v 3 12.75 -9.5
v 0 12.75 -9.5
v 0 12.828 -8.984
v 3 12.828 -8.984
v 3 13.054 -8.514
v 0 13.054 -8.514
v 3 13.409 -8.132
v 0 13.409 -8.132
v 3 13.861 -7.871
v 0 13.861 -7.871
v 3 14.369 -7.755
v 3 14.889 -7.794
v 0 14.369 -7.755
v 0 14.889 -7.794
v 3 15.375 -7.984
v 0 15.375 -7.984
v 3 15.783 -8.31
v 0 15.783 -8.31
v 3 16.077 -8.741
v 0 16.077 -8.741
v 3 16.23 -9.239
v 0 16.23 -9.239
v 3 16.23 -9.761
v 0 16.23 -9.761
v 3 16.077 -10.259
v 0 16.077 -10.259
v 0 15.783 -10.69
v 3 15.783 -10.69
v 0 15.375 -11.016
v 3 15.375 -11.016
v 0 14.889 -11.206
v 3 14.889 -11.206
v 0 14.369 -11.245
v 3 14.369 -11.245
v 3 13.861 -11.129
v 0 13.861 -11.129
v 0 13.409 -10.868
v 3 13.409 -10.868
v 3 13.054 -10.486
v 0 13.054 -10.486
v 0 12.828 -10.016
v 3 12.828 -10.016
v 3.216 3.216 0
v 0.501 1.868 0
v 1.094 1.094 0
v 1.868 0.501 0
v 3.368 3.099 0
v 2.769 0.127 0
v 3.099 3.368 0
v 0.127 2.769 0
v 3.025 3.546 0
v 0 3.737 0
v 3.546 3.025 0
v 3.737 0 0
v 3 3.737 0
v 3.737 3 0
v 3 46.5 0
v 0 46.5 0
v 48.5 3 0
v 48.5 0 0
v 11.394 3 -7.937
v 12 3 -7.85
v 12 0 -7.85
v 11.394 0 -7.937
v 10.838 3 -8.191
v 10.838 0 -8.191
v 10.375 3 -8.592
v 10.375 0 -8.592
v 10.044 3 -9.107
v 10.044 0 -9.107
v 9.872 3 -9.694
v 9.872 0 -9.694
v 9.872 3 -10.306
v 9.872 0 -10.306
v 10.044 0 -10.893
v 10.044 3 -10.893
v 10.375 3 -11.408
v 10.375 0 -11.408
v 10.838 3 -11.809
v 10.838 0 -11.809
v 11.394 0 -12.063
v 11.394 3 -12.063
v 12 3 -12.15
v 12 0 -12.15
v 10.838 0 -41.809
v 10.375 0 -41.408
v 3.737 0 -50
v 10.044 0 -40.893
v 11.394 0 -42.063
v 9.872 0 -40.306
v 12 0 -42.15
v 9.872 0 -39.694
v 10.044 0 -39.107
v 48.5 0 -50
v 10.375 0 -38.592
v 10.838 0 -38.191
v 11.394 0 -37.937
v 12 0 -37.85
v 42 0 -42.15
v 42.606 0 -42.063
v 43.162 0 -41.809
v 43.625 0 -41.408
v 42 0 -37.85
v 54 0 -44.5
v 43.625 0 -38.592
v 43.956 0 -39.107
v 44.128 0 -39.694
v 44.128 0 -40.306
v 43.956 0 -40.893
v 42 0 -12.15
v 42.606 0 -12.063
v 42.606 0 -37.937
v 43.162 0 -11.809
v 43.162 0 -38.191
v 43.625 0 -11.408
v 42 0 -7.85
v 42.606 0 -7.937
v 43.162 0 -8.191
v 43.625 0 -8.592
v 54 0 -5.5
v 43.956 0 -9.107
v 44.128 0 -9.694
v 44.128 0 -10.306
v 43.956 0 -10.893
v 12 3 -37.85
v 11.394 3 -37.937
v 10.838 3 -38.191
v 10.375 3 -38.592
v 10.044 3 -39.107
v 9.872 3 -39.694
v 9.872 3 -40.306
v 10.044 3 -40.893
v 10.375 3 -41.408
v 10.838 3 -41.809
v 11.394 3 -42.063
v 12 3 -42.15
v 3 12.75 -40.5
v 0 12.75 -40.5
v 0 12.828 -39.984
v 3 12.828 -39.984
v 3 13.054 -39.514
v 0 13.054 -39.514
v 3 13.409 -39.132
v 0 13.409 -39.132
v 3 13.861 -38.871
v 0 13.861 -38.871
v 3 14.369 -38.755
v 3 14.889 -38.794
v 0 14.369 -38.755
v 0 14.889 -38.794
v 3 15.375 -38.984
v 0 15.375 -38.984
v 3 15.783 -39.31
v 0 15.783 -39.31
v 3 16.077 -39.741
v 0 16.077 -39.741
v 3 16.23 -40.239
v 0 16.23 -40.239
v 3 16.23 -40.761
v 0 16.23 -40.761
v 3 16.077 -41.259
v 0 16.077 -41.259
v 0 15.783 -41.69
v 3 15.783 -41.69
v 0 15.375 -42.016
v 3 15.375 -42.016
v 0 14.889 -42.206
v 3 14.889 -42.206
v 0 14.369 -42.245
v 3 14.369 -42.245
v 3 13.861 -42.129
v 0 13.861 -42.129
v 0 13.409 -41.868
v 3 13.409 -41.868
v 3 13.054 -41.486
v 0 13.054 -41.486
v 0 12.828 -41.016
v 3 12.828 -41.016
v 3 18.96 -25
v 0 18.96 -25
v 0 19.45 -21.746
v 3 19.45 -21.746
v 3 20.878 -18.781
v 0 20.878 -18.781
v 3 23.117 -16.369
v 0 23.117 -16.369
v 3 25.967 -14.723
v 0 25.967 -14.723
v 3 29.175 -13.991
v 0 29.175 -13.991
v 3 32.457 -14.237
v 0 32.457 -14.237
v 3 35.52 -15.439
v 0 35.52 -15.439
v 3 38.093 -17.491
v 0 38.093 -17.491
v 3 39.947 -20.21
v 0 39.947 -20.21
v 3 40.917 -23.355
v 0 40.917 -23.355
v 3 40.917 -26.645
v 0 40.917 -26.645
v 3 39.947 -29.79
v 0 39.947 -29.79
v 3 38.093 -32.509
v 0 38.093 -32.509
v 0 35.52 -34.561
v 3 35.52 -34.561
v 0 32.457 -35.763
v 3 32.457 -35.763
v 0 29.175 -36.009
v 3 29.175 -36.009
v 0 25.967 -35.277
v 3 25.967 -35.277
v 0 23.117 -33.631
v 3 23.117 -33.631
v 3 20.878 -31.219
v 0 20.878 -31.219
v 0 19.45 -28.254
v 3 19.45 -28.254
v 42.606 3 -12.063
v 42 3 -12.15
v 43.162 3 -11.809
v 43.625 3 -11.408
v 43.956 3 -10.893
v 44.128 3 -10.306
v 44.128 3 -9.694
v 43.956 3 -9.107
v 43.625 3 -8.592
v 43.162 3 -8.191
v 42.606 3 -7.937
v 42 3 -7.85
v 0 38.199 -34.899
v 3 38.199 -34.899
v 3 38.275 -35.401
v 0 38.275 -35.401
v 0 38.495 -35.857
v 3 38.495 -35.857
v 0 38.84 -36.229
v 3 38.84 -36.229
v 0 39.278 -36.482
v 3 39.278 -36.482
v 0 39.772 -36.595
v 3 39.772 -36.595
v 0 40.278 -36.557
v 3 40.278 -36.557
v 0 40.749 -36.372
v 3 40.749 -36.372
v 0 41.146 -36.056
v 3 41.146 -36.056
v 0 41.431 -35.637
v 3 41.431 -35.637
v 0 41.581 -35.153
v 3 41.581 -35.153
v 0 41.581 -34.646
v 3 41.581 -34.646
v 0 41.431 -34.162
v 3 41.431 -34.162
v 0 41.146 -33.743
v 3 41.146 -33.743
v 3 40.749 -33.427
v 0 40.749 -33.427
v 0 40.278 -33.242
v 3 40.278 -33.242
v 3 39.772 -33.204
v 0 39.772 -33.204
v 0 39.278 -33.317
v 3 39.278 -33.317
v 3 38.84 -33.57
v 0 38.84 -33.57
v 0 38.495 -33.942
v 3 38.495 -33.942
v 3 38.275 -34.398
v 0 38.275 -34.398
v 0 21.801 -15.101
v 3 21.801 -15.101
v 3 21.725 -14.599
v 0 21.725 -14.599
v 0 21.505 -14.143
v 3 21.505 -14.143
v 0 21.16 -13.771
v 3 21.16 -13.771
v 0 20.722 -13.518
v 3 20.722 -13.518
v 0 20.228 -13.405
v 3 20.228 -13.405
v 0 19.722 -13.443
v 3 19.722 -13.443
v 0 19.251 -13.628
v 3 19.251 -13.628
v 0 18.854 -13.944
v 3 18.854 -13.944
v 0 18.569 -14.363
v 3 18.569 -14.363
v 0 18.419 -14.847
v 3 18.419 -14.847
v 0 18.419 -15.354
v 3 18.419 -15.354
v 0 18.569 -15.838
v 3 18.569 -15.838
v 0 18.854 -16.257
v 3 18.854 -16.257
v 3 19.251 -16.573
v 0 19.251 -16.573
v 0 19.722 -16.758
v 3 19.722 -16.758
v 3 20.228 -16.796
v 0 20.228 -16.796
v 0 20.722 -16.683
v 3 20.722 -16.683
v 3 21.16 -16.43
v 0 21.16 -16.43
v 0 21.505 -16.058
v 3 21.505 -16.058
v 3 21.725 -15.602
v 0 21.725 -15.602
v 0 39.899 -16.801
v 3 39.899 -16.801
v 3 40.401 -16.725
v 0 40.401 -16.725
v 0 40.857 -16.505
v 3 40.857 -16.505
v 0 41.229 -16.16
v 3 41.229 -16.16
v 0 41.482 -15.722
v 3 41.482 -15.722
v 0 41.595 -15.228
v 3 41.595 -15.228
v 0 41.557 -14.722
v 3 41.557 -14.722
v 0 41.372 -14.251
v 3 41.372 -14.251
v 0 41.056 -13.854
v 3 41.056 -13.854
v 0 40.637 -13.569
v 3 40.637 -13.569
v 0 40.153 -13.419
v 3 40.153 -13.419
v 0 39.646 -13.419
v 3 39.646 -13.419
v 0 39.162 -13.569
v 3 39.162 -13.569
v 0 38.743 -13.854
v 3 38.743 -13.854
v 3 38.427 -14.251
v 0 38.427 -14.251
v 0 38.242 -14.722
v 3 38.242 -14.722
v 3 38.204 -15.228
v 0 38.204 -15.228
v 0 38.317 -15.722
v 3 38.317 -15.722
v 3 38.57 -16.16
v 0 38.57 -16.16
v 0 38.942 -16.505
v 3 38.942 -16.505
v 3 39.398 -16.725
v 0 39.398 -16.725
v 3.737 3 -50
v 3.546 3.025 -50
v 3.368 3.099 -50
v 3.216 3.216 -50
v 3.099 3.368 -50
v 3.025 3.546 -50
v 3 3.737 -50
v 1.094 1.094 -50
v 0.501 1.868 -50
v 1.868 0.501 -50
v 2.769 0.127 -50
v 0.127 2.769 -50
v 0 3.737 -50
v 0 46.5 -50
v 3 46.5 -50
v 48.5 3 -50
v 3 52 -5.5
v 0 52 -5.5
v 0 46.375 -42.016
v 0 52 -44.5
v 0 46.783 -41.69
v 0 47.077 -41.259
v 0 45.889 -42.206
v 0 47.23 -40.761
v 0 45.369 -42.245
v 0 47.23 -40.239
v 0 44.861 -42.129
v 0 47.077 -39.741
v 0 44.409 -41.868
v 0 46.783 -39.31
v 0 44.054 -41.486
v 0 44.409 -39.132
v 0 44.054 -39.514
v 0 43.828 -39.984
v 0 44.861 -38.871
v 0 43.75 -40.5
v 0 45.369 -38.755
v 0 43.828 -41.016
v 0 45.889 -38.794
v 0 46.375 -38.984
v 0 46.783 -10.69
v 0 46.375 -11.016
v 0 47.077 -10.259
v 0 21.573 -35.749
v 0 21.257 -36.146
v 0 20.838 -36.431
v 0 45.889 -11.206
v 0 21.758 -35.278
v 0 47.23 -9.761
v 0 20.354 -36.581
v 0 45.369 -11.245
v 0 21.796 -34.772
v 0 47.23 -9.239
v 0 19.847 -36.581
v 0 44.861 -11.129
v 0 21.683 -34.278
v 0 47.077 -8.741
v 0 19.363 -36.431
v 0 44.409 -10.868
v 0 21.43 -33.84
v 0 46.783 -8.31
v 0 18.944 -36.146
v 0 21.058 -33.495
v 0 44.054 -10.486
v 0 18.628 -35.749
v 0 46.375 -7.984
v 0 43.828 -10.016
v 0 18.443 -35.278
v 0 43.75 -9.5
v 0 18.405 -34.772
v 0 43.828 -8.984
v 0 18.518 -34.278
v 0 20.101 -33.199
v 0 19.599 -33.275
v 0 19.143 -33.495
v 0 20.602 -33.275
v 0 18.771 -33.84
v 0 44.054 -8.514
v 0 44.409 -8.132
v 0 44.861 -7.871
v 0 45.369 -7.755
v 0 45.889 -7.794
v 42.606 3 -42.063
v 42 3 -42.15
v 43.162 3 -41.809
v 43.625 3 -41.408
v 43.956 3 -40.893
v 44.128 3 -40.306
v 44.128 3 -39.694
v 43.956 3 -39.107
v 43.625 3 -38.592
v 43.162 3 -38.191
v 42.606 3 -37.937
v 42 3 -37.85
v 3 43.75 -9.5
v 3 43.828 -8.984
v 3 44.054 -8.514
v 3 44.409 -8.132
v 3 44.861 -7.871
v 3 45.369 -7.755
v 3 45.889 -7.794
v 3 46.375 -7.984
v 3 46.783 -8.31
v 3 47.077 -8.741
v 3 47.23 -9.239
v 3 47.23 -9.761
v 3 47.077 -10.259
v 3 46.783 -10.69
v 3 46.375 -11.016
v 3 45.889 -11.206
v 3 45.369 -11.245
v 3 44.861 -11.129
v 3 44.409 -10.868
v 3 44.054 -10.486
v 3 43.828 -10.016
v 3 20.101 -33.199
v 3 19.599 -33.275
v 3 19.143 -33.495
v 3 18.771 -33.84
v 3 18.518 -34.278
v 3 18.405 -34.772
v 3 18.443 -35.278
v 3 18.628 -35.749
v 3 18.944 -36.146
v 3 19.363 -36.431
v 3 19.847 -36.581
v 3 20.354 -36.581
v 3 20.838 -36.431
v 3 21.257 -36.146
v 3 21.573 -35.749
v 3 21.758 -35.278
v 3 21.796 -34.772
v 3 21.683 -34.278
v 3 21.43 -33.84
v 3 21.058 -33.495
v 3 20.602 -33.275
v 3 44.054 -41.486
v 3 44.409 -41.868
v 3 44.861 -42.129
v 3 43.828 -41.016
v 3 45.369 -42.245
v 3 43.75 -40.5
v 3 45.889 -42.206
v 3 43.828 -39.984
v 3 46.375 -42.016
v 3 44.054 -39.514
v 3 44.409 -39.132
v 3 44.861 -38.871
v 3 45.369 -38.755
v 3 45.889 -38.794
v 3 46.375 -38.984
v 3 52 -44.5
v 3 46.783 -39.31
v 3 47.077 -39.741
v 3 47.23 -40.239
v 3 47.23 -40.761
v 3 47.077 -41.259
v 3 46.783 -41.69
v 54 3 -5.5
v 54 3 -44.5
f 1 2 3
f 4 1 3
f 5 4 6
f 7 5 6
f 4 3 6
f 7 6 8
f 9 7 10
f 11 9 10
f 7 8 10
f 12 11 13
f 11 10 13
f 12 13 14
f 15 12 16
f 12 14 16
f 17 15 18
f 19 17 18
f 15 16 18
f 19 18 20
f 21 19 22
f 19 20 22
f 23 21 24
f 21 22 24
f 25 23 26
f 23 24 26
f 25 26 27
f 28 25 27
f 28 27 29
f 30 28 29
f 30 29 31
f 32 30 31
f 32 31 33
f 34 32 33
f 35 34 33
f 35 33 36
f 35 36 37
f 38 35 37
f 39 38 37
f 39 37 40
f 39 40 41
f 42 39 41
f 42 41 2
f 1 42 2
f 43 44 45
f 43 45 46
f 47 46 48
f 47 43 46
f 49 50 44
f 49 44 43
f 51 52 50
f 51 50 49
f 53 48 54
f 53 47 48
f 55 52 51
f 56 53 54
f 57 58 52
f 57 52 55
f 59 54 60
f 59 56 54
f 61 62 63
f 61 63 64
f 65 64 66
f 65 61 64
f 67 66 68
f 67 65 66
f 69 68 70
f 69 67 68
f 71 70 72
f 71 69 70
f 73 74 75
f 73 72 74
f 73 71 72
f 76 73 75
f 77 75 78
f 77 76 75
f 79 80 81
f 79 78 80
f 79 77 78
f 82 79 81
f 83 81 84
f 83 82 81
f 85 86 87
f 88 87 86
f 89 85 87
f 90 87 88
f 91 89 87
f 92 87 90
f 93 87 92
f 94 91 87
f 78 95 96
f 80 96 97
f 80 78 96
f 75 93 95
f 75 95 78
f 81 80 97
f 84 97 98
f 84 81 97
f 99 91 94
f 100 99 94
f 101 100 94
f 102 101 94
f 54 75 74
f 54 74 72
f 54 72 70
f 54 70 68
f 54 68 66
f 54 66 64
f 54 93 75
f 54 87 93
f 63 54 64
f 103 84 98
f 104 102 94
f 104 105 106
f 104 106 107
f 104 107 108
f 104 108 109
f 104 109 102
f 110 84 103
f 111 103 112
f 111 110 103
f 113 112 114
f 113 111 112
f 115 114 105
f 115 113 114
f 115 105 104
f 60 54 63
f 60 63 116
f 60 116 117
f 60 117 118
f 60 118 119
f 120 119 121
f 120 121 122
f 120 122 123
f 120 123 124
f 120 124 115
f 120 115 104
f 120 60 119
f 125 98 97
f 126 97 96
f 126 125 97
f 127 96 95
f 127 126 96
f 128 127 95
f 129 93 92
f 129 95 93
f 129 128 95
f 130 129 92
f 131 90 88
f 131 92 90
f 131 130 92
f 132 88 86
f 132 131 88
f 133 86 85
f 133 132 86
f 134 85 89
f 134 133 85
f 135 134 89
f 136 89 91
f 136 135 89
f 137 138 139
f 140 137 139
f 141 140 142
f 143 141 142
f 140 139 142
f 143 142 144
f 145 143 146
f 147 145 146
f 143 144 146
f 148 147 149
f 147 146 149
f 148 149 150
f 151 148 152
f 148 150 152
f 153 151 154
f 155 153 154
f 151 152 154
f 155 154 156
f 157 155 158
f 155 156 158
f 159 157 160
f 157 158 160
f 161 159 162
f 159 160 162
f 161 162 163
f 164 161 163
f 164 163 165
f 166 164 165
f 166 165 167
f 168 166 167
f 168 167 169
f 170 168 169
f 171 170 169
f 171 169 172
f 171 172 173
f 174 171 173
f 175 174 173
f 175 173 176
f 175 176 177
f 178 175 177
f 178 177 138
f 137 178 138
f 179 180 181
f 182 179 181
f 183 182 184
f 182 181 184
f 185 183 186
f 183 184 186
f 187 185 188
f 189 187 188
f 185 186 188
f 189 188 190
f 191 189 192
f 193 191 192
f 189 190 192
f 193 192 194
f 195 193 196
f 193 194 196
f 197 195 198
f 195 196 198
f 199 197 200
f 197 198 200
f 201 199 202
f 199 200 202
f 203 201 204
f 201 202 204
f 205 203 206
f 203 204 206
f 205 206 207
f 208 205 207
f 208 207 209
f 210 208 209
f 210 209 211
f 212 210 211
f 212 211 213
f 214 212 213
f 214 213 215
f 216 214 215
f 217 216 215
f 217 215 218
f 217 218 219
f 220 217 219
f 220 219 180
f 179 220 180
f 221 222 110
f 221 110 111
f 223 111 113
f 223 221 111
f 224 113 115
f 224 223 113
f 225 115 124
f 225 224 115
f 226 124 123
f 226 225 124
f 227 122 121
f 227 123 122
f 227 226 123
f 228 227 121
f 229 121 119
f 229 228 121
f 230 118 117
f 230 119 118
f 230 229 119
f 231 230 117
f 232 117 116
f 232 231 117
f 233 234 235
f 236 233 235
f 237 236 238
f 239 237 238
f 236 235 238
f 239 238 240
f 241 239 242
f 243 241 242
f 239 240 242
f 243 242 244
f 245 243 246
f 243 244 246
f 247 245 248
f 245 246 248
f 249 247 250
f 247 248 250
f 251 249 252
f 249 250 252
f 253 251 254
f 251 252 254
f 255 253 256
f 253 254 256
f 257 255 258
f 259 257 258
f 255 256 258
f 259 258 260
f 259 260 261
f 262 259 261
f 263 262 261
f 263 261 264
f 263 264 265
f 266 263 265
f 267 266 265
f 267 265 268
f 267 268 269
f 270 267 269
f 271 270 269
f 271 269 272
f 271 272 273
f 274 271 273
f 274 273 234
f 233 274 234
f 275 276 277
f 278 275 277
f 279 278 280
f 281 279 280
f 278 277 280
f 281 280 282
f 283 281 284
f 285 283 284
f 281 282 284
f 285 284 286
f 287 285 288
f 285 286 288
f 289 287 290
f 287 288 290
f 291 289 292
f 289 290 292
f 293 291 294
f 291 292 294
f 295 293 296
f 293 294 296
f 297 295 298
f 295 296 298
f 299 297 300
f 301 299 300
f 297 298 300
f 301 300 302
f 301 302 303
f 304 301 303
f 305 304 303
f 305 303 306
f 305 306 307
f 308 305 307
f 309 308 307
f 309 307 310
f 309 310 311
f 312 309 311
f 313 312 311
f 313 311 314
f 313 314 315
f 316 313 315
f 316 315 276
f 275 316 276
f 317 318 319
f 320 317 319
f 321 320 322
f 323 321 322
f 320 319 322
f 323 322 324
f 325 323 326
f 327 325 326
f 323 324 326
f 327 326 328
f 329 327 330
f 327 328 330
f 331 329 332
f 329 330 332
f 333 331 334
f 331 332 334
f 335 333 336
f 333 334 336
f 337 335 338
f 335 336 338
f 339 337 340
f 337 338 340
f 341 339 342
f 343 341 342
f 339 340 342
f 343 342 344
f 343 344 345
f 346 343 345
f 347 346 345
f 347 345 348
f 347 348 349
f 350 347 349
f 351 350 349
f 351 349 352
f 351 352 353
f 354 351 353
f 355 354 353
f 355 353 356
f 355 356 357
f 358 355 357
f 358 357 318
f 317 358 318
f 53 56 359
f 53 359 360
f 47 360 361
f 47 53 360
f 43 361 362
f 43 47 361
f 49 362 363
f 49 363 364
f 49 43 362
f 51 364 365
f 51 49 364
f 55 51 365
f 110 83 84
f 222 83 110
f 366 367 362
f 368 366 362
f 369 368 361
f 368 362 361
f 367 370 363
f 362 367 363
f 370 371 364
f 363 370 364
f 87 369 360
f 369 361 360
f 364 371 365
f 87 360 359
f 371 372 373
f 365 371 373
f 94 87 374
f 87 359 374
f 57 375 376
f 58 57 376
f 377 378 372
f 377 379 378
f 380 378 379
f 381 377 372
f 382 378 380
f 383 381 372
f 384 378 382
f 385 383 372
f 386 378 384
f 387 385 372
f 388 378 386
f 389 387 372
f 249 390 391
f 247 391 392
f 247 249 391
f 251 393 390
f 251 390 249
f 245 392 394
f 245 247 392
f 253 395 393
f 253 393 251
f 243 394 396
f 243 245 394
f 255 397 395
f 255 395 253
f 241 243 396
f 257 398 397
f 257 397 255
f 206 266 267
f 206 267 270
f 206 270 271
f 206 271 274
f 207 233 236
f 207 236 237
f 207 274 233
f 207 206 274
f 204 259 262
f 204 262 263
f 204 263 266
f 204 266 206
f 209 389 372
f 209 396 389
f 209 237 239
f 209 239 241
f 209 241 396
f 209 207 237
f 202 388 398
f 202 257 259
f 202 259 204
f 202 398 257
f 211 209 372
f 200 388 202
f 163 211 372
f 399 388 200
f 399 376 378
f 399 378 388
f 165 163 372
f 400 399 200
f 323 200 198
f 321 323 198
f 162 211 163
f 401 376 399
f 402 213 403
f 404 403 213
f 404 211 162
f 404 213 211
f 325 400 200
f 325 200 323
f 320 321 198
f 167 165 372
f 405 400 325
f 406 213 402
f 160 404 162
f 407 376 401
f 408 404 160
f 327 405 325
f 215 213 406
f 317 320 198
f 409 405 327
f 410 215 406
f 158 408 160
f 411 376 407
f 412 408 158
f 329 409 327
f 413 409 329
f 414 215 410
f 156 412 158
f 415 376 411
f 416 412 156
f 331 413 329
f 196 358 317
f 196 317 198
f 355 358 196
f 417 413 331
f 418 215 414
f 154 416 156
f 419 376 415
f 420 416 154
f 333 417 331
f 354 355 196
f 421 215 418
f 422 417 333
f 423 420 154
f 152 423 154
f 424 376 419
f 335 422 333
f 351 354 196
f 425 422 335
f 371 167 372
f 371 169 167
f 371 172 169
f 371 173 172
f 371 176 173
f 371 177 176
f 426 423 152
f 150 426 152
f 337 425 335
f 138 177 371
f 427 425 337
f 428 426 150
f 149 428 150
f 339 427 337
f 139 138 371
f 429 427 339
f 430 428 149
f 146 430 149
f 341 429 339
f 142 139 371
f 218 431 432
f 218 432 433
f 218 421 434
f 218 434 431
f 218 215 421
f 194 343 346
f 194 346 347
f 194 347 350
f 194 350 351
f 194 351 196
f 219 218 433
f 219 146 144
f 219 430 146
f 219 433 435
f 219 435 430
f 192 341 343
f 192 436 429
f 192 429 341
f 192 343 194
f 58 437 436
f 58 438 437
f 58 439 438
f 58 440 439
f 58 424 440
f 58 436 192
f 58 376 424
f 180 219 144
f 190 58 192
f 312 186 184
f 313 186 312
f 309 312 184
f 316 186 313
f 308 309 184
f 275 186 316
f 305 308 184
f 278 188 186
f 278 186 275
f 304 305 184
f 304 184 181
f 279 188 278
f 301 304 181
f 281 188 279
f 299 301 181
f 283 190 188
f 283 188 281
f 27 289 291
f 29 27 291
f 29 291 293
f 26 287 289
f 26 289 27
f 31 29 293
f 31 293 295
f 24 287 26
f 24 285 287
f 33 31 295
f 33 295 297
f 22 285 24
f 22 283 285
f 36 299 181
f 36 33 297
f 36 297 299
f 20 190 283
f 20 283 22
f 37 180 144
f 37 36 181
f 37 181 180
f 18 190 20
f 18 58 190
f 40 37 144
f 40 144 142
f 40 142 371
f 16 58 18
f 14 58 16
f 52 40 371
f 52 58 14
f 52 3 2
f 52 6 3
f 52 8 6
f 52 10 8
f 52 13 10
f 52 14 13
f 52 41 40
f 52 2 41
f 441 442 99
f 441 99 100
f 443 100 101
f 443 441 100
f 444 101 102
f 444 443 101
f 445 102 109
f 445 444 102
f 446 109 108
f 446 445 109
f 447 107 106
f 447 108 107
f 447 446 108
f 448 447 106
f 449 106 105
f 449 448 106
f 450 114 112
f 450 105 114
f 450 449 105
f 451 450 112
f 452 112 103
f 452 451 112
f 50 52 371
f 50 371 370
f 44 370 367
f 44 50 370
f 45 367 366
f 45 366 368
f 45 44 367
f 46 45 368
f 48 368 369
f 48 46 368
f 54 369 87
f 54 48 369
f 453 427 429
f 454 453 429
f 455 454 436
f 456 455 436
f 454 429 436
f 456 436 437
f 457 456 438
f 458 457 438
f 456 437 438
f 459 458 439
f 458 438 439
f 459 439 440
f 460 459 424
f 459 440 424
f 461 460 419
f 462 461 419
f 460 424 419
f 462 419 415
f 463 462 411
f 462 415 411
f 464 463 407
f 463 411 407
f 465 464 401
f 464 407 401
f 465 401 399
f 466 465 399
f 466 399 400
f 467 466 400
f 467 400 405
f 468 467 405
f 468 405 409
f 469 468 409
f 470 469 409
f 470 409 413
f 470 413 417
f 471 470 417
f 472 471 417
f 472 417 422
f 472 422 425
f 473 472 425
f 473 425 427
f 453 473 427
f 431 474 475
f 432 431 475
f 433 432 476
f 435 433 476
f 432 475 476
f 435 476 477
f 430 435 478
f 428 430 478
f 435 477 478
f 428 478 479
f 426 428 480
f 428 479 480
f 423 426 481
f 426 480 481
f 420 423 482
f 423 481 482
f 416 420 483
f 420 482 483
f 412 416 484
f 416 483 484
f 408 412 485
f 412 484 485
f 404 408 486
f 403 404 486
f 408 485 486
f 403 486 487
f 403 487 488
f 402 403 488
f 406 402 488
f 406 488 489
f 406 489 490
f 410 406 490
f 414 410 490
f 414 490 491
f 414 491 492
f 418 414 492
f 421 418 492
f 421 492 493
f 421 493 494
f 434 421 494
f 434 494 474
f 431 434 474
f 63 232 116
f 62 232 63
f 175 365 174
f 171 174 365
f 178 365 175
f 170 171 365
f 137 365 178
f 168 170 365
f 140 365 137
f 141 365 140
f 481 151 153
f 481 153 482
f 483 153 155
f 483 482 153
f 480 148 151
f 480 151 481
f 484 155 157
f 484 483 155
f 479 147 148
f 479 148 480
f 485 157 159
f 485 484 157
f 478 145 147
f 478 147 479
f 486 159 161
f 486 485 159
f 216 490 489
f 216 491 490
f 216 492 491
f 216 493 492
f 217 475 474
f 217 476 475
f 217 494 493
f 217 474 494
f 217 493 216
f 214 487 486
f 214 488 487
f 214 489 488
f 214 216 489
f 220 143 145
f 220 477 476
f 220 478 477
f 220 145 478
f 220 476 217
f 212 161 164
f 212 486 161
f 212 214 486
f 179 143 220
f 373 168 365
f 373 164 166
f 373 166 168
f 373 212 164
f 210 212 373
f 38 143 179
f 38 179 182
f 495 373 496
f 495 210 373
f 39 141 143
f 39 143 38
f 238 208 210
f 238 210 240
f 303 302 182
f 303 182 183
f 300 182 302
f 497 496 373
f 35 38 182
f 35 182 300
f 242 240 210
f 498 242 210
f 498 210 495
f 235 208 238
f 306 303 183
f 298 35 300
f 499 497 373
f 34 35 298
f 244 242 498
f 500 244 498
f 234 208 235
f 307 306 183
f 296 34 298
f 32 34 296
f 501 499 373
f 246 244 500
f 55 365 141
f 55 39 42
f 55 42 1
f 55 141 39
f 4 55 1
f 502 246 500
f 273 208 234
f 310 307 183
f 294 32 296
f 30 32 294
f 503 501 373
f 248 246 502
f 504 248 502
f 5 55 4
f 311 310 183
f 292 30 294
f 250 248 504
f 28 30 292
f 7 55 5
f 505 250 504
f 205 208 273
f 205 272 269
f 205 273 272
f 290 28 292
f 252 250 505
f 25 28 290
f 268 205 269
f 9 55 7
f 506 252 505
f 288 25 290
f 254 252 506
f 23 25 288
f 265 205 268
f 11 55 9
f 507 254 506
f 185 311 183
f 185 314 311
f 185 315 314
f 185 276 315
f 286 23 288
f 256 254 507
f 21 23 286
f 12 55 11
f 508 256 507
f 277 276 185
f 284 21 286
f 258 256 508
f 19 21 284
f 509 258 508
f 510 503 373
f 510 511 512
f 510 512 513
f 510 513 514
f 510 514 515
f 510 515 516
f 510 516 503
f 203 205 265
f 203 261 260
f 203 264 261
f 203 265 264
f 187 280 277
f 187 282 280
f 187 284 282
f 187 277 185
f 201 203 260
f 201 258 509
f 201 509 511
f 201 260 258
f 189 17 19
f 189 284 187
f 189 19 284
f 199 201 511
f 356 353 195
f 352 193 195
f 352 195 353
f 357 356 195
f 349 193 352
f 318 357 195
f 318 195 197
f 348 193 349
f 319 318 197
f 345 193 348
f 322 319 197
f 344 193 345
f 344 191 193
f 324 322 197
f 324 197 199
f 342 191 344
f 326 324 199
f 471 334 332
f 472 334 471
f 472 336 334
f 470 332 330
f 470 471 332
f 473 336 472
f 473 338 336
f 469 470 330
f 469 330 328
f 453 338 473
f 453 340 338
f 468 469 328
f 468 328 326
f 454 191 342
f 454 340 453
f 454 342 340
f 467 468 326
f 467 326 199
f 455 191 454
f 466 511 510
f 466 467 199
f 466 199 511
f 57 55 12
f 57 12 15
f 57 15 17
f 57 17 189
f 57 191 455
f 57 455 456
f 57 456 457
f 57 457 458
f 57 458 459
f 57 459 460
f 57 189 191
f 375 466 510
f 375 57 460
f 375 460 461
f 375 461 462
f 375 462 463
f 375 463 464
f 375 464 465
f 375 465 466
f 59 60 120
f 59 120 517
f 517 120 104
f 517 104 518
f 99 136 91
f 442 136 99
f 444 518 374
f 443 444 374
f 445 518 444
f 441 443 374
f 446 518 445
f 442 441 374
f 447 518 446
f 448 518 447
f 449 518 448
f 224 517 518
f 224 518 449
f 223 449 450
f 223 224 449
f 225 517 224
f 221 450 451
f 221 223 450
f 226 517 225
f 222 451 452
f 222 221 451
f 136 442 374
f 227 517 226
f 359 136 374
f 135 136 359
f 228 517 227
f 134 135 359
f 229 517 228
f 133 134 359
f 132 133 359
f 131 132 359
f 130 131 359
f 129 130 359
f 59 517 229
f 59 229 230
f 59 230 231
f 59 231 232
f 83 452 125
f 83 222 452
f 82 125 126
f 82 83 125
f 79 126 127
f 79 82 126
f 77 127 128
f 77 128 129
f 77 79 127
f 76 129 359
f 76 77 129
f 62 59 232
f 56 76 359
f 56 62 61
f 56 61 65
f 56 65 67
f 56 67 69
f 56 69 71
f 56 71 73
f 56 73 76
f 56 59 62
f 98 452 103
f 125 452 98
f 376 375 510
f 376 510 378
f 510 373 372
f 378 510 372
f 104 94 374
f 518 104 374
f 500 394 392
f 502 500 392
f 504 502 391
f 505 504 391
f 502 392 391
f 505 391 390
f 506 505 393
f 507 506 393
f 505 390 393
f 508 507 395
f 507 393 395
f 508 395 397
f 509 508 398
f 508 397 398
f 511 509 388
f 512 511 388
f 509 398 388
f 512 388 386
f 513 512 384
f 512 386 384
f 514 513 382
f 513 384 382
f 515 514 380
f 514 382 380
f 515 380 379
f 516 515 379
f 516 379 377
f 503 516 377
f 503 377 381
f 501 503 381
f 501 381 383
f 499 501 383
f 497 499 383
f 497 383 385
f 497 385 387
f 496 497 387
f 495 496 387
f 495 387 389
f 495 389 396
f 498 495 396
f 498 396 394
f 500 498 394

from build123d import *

# Parameters (mm, degrees)
BASE_FLANGE1_DEPTH           = 50
CUT_EXTRUDE1_REACH           = 92.111
SKETCH23_R                   = 11.04
SKETCH23_R_2                 = 1.75
CUT_EXTRUDE2_REACH           = 90.414
CHAMFER1_SIZE                = 5.5
TALADRO_DE_MARGEN_PARA_M31_D = 3.4
MATRIZC1_COUNT               = 4


# Sheet-metal steps are written as plain solids
with BuildPart() as part:
    # Sketch2 → Base-Flange1 (new body)
    with BuildSketch(Plane(origin=(0, 0, 0), x_dir=(-1, 0, 0), z_dir=(0, 0, -1))):
        with BuildLine():
            Line((0, 52), (0, 3.7366))
            ThreePointArc((0, 3.7366), (-1.094424801, 1.094424801), (-3.7366, 0))
            Line((-3.7366, 0), (-54, 0))
            Line((-54, 0), (-54, 3))
            Line((-54, 3), (-3.7366, 3))
            ThreePointArc((-3.7366, 3), (-3.215745145, 3.215745145), (-3, 3.7366))
            Line((-3, 3.7366), (-3, 52))
            Line((-3, 52), (0, 52))
        make_face()
    extrude(amount=BASE_FLANGE1_DEPTH)

    # Sketch23 → Cut-Extrude1 (cut, up to next)
    with BuildSketch(Plane.ZY, mode=Mode.PRIVATE) as cut_extrude1_sk1:
        with Locations(Location((-25, 30, 0), (0, 0, 270))):
            Circle(SKETCH23_R)
    cut_extrude1_tool1 = extrude(cut_extrude1_sk1.sketch, amount=-CUT_EXTRUDE1_REACH, mode=Mode.PRIVATE) & part.part
    # Sketch23 → Cut-Extrude1 (cut, up to next)
    with BuildSketch(Plane.ZY, mode=Mode.PRIVATE) as cut_extrude1_sk2:
        with Locations(Location((-9.5, 45.5, 0), (0, 0, 270))):
            Circle(SKETCH23_R_2)
    cut_extrude1_tool2 = extrude(cut_extrude1_sk2.sketch, amount=-CUT_EXTRUDE1_REACH, mode=Mode.PRIVATE) & part.part
    # Sketch23 → Cut-Extrude1 (cut, up to next)
    with BuildSketch(Plane.ZY, mode=Mode.PRIVATE) as cut_extrude1_sk3:
        with Locations(Location((-9.5, 14.5, 0), (0, 0, 270))):
            Circle(SKETCH23_R_2)
    cut_extrude1_tool3 = extrude(cut_extrude1_sk3.sketch, amount=-CUT_EXTRUDE1_REACH, mode=Mode.PRIVATE) & part.part
    # Sketch23 → Cut-Extrude1 (cut, up to next)
    with BuildSketch(Plane.ZY, mode=Mode.PRIVATE) as cut_extrude1_sk4:
        with Locations(Location((-40.5, 14.5, 0), (0, 0, 270))):
            Circle(SKETCH23_R_2)
    cut_extrude1_tool4 = extrude(cut_extrude1_sk4.sketch, amount=-CUT_EXTRUDE1_REACH, mode=Mode.PRIVATE) & part.part
    # Sketch23 → Cut-Extrude1 (cut, up to next)
    with BuildSketch(Plane.ZY, mode=Mode.PRIVATE) as cut_extrude1_sk5:
        with Locations(Location((-40.5, 45.5, 0), (0, 0, 270))):
            Circle(SKETCH23_R_2)
    cut_extrude1_tool5 = extrude(cut_extrude1_sk5.sketch, amount=-CUT_EXTRUDE1_REACH, mode=Mode.PRIVATE) & part.part
    add(cut_extrude1_tool1.solids().sort_by_distance((0, 30, -25))[0], mode=Mode.SUBTRACT)
    add(cut_extrude1_tool2.solids().sort_by_distance((0, 45.5, -9.5))[0], mode=Mode.SUBTRACT)
    add(cut_extrude1_tool3.solids().sort_by_distance((0, 14.5, -9.5))[0], mode=Mode.SUBTRACT)
    add(cut_extrude1_tool4.solids().sort_by_distance((0, 14.5, -40.5))[0], mode=Mode.SUBTRACT)
    add(cut_extrude1_tool5.solids().sort_by_distance((0, 45.5, -40.5))[0], mode=Mode.SUBTRACT)

    # Sketch24 → Cut-Extrude2 (cut, up to next)
    with BuildSketch(Plane(origin=(0, 3, 0), x_dir=(1, 0, 0), z_dir=(0, 1, 0)), mode=Mode.PRIVATE) as cut_extrude2_sk1:
        with BuildLine():
            Line((42, 7.85), (12, 7.85))
            ThreePointArc((12, 7.85), (9.85, 10), (12, 12.15))
            Line((12, 12.15), (42, 12.15))
            ThreePointArc((42, 12.15), (44.15, 10), (42, 7.85))
        make_face()
    cut_extrude2_tool1 = extrude(cut_extrude2_sk1.sketch, amount=-CUT_EXTRUDE2_REACH, mode=Mode.PRIVATE) & part.part
    # Sketch24 → Cut-Extrude2 (cut, up to next)
    with BuildSketch(Plane(origin=(0, 3, 0), x_dir=(1, 0, 0), z_dir=(0, 1, 0)), mode=Mode.PRIVATE) as cut_extrude2_sk2:
        with BuildLine():
            Line((12, 42.15), (42, 42.15))
            ThreePointArc((42, 42.15), (44.15, 40), (42, 37.85))
            Line((42, 37.85), (12, 37.85))
            ThreePointArc((12, 37.85), (9.85, 40), (12, 42.15))
        make_face()
    cut_extrude2_tool2 = extrude(cut_extrude2_sk2.sketch, amount=-CUT_EXTRUDE2_REACH, mode=Mode.PRIVATE) & part.part
    add(cut_extrude2_tool1.solids().sort_by_distance((27, 3, -10))[0], mode=Mode.SUBTRACT)
    add(cut_extrude2_tool2.solids().sort_by_distance((27, 3, -40))[0], mode=Mode.SUBTRACT)

    # Chamfer1
    chamfer1_edges = [part.edges().sort_by_distance(p)[0] for p in [
        (1.5, 52, -50),
        (54, 1.5, -50),
        (1.5, 52, 0),
        (54, 1.5, 0),
    ]]
    chamfer(chamfer1_edges, length=CHAMFER1_SIZE)

    # Taladro de margen para M31 (through all)
    with Locations(Plane.ZY):
        with Locations((-15.100505063, 39.899494937)):
            taladro_de_margen_para_m31 = Hole(TALADRO_DE_MARGEN_PARA_M31_D / 2)

    # MatrizC1: Taladro de margen para M31 ×4 about axis
    matrizc1_axis = Axis((0, 30, -25), (1, 0, 0))
    for i in range(1, MATRIZC1_COUNT):
        add(taladro_de_margen_para_m31.rotate(matrizc1_axis, i * 360 / MATRIZC1_COUNT), mode=Mode.SUBTRACT)


solid = part.part
